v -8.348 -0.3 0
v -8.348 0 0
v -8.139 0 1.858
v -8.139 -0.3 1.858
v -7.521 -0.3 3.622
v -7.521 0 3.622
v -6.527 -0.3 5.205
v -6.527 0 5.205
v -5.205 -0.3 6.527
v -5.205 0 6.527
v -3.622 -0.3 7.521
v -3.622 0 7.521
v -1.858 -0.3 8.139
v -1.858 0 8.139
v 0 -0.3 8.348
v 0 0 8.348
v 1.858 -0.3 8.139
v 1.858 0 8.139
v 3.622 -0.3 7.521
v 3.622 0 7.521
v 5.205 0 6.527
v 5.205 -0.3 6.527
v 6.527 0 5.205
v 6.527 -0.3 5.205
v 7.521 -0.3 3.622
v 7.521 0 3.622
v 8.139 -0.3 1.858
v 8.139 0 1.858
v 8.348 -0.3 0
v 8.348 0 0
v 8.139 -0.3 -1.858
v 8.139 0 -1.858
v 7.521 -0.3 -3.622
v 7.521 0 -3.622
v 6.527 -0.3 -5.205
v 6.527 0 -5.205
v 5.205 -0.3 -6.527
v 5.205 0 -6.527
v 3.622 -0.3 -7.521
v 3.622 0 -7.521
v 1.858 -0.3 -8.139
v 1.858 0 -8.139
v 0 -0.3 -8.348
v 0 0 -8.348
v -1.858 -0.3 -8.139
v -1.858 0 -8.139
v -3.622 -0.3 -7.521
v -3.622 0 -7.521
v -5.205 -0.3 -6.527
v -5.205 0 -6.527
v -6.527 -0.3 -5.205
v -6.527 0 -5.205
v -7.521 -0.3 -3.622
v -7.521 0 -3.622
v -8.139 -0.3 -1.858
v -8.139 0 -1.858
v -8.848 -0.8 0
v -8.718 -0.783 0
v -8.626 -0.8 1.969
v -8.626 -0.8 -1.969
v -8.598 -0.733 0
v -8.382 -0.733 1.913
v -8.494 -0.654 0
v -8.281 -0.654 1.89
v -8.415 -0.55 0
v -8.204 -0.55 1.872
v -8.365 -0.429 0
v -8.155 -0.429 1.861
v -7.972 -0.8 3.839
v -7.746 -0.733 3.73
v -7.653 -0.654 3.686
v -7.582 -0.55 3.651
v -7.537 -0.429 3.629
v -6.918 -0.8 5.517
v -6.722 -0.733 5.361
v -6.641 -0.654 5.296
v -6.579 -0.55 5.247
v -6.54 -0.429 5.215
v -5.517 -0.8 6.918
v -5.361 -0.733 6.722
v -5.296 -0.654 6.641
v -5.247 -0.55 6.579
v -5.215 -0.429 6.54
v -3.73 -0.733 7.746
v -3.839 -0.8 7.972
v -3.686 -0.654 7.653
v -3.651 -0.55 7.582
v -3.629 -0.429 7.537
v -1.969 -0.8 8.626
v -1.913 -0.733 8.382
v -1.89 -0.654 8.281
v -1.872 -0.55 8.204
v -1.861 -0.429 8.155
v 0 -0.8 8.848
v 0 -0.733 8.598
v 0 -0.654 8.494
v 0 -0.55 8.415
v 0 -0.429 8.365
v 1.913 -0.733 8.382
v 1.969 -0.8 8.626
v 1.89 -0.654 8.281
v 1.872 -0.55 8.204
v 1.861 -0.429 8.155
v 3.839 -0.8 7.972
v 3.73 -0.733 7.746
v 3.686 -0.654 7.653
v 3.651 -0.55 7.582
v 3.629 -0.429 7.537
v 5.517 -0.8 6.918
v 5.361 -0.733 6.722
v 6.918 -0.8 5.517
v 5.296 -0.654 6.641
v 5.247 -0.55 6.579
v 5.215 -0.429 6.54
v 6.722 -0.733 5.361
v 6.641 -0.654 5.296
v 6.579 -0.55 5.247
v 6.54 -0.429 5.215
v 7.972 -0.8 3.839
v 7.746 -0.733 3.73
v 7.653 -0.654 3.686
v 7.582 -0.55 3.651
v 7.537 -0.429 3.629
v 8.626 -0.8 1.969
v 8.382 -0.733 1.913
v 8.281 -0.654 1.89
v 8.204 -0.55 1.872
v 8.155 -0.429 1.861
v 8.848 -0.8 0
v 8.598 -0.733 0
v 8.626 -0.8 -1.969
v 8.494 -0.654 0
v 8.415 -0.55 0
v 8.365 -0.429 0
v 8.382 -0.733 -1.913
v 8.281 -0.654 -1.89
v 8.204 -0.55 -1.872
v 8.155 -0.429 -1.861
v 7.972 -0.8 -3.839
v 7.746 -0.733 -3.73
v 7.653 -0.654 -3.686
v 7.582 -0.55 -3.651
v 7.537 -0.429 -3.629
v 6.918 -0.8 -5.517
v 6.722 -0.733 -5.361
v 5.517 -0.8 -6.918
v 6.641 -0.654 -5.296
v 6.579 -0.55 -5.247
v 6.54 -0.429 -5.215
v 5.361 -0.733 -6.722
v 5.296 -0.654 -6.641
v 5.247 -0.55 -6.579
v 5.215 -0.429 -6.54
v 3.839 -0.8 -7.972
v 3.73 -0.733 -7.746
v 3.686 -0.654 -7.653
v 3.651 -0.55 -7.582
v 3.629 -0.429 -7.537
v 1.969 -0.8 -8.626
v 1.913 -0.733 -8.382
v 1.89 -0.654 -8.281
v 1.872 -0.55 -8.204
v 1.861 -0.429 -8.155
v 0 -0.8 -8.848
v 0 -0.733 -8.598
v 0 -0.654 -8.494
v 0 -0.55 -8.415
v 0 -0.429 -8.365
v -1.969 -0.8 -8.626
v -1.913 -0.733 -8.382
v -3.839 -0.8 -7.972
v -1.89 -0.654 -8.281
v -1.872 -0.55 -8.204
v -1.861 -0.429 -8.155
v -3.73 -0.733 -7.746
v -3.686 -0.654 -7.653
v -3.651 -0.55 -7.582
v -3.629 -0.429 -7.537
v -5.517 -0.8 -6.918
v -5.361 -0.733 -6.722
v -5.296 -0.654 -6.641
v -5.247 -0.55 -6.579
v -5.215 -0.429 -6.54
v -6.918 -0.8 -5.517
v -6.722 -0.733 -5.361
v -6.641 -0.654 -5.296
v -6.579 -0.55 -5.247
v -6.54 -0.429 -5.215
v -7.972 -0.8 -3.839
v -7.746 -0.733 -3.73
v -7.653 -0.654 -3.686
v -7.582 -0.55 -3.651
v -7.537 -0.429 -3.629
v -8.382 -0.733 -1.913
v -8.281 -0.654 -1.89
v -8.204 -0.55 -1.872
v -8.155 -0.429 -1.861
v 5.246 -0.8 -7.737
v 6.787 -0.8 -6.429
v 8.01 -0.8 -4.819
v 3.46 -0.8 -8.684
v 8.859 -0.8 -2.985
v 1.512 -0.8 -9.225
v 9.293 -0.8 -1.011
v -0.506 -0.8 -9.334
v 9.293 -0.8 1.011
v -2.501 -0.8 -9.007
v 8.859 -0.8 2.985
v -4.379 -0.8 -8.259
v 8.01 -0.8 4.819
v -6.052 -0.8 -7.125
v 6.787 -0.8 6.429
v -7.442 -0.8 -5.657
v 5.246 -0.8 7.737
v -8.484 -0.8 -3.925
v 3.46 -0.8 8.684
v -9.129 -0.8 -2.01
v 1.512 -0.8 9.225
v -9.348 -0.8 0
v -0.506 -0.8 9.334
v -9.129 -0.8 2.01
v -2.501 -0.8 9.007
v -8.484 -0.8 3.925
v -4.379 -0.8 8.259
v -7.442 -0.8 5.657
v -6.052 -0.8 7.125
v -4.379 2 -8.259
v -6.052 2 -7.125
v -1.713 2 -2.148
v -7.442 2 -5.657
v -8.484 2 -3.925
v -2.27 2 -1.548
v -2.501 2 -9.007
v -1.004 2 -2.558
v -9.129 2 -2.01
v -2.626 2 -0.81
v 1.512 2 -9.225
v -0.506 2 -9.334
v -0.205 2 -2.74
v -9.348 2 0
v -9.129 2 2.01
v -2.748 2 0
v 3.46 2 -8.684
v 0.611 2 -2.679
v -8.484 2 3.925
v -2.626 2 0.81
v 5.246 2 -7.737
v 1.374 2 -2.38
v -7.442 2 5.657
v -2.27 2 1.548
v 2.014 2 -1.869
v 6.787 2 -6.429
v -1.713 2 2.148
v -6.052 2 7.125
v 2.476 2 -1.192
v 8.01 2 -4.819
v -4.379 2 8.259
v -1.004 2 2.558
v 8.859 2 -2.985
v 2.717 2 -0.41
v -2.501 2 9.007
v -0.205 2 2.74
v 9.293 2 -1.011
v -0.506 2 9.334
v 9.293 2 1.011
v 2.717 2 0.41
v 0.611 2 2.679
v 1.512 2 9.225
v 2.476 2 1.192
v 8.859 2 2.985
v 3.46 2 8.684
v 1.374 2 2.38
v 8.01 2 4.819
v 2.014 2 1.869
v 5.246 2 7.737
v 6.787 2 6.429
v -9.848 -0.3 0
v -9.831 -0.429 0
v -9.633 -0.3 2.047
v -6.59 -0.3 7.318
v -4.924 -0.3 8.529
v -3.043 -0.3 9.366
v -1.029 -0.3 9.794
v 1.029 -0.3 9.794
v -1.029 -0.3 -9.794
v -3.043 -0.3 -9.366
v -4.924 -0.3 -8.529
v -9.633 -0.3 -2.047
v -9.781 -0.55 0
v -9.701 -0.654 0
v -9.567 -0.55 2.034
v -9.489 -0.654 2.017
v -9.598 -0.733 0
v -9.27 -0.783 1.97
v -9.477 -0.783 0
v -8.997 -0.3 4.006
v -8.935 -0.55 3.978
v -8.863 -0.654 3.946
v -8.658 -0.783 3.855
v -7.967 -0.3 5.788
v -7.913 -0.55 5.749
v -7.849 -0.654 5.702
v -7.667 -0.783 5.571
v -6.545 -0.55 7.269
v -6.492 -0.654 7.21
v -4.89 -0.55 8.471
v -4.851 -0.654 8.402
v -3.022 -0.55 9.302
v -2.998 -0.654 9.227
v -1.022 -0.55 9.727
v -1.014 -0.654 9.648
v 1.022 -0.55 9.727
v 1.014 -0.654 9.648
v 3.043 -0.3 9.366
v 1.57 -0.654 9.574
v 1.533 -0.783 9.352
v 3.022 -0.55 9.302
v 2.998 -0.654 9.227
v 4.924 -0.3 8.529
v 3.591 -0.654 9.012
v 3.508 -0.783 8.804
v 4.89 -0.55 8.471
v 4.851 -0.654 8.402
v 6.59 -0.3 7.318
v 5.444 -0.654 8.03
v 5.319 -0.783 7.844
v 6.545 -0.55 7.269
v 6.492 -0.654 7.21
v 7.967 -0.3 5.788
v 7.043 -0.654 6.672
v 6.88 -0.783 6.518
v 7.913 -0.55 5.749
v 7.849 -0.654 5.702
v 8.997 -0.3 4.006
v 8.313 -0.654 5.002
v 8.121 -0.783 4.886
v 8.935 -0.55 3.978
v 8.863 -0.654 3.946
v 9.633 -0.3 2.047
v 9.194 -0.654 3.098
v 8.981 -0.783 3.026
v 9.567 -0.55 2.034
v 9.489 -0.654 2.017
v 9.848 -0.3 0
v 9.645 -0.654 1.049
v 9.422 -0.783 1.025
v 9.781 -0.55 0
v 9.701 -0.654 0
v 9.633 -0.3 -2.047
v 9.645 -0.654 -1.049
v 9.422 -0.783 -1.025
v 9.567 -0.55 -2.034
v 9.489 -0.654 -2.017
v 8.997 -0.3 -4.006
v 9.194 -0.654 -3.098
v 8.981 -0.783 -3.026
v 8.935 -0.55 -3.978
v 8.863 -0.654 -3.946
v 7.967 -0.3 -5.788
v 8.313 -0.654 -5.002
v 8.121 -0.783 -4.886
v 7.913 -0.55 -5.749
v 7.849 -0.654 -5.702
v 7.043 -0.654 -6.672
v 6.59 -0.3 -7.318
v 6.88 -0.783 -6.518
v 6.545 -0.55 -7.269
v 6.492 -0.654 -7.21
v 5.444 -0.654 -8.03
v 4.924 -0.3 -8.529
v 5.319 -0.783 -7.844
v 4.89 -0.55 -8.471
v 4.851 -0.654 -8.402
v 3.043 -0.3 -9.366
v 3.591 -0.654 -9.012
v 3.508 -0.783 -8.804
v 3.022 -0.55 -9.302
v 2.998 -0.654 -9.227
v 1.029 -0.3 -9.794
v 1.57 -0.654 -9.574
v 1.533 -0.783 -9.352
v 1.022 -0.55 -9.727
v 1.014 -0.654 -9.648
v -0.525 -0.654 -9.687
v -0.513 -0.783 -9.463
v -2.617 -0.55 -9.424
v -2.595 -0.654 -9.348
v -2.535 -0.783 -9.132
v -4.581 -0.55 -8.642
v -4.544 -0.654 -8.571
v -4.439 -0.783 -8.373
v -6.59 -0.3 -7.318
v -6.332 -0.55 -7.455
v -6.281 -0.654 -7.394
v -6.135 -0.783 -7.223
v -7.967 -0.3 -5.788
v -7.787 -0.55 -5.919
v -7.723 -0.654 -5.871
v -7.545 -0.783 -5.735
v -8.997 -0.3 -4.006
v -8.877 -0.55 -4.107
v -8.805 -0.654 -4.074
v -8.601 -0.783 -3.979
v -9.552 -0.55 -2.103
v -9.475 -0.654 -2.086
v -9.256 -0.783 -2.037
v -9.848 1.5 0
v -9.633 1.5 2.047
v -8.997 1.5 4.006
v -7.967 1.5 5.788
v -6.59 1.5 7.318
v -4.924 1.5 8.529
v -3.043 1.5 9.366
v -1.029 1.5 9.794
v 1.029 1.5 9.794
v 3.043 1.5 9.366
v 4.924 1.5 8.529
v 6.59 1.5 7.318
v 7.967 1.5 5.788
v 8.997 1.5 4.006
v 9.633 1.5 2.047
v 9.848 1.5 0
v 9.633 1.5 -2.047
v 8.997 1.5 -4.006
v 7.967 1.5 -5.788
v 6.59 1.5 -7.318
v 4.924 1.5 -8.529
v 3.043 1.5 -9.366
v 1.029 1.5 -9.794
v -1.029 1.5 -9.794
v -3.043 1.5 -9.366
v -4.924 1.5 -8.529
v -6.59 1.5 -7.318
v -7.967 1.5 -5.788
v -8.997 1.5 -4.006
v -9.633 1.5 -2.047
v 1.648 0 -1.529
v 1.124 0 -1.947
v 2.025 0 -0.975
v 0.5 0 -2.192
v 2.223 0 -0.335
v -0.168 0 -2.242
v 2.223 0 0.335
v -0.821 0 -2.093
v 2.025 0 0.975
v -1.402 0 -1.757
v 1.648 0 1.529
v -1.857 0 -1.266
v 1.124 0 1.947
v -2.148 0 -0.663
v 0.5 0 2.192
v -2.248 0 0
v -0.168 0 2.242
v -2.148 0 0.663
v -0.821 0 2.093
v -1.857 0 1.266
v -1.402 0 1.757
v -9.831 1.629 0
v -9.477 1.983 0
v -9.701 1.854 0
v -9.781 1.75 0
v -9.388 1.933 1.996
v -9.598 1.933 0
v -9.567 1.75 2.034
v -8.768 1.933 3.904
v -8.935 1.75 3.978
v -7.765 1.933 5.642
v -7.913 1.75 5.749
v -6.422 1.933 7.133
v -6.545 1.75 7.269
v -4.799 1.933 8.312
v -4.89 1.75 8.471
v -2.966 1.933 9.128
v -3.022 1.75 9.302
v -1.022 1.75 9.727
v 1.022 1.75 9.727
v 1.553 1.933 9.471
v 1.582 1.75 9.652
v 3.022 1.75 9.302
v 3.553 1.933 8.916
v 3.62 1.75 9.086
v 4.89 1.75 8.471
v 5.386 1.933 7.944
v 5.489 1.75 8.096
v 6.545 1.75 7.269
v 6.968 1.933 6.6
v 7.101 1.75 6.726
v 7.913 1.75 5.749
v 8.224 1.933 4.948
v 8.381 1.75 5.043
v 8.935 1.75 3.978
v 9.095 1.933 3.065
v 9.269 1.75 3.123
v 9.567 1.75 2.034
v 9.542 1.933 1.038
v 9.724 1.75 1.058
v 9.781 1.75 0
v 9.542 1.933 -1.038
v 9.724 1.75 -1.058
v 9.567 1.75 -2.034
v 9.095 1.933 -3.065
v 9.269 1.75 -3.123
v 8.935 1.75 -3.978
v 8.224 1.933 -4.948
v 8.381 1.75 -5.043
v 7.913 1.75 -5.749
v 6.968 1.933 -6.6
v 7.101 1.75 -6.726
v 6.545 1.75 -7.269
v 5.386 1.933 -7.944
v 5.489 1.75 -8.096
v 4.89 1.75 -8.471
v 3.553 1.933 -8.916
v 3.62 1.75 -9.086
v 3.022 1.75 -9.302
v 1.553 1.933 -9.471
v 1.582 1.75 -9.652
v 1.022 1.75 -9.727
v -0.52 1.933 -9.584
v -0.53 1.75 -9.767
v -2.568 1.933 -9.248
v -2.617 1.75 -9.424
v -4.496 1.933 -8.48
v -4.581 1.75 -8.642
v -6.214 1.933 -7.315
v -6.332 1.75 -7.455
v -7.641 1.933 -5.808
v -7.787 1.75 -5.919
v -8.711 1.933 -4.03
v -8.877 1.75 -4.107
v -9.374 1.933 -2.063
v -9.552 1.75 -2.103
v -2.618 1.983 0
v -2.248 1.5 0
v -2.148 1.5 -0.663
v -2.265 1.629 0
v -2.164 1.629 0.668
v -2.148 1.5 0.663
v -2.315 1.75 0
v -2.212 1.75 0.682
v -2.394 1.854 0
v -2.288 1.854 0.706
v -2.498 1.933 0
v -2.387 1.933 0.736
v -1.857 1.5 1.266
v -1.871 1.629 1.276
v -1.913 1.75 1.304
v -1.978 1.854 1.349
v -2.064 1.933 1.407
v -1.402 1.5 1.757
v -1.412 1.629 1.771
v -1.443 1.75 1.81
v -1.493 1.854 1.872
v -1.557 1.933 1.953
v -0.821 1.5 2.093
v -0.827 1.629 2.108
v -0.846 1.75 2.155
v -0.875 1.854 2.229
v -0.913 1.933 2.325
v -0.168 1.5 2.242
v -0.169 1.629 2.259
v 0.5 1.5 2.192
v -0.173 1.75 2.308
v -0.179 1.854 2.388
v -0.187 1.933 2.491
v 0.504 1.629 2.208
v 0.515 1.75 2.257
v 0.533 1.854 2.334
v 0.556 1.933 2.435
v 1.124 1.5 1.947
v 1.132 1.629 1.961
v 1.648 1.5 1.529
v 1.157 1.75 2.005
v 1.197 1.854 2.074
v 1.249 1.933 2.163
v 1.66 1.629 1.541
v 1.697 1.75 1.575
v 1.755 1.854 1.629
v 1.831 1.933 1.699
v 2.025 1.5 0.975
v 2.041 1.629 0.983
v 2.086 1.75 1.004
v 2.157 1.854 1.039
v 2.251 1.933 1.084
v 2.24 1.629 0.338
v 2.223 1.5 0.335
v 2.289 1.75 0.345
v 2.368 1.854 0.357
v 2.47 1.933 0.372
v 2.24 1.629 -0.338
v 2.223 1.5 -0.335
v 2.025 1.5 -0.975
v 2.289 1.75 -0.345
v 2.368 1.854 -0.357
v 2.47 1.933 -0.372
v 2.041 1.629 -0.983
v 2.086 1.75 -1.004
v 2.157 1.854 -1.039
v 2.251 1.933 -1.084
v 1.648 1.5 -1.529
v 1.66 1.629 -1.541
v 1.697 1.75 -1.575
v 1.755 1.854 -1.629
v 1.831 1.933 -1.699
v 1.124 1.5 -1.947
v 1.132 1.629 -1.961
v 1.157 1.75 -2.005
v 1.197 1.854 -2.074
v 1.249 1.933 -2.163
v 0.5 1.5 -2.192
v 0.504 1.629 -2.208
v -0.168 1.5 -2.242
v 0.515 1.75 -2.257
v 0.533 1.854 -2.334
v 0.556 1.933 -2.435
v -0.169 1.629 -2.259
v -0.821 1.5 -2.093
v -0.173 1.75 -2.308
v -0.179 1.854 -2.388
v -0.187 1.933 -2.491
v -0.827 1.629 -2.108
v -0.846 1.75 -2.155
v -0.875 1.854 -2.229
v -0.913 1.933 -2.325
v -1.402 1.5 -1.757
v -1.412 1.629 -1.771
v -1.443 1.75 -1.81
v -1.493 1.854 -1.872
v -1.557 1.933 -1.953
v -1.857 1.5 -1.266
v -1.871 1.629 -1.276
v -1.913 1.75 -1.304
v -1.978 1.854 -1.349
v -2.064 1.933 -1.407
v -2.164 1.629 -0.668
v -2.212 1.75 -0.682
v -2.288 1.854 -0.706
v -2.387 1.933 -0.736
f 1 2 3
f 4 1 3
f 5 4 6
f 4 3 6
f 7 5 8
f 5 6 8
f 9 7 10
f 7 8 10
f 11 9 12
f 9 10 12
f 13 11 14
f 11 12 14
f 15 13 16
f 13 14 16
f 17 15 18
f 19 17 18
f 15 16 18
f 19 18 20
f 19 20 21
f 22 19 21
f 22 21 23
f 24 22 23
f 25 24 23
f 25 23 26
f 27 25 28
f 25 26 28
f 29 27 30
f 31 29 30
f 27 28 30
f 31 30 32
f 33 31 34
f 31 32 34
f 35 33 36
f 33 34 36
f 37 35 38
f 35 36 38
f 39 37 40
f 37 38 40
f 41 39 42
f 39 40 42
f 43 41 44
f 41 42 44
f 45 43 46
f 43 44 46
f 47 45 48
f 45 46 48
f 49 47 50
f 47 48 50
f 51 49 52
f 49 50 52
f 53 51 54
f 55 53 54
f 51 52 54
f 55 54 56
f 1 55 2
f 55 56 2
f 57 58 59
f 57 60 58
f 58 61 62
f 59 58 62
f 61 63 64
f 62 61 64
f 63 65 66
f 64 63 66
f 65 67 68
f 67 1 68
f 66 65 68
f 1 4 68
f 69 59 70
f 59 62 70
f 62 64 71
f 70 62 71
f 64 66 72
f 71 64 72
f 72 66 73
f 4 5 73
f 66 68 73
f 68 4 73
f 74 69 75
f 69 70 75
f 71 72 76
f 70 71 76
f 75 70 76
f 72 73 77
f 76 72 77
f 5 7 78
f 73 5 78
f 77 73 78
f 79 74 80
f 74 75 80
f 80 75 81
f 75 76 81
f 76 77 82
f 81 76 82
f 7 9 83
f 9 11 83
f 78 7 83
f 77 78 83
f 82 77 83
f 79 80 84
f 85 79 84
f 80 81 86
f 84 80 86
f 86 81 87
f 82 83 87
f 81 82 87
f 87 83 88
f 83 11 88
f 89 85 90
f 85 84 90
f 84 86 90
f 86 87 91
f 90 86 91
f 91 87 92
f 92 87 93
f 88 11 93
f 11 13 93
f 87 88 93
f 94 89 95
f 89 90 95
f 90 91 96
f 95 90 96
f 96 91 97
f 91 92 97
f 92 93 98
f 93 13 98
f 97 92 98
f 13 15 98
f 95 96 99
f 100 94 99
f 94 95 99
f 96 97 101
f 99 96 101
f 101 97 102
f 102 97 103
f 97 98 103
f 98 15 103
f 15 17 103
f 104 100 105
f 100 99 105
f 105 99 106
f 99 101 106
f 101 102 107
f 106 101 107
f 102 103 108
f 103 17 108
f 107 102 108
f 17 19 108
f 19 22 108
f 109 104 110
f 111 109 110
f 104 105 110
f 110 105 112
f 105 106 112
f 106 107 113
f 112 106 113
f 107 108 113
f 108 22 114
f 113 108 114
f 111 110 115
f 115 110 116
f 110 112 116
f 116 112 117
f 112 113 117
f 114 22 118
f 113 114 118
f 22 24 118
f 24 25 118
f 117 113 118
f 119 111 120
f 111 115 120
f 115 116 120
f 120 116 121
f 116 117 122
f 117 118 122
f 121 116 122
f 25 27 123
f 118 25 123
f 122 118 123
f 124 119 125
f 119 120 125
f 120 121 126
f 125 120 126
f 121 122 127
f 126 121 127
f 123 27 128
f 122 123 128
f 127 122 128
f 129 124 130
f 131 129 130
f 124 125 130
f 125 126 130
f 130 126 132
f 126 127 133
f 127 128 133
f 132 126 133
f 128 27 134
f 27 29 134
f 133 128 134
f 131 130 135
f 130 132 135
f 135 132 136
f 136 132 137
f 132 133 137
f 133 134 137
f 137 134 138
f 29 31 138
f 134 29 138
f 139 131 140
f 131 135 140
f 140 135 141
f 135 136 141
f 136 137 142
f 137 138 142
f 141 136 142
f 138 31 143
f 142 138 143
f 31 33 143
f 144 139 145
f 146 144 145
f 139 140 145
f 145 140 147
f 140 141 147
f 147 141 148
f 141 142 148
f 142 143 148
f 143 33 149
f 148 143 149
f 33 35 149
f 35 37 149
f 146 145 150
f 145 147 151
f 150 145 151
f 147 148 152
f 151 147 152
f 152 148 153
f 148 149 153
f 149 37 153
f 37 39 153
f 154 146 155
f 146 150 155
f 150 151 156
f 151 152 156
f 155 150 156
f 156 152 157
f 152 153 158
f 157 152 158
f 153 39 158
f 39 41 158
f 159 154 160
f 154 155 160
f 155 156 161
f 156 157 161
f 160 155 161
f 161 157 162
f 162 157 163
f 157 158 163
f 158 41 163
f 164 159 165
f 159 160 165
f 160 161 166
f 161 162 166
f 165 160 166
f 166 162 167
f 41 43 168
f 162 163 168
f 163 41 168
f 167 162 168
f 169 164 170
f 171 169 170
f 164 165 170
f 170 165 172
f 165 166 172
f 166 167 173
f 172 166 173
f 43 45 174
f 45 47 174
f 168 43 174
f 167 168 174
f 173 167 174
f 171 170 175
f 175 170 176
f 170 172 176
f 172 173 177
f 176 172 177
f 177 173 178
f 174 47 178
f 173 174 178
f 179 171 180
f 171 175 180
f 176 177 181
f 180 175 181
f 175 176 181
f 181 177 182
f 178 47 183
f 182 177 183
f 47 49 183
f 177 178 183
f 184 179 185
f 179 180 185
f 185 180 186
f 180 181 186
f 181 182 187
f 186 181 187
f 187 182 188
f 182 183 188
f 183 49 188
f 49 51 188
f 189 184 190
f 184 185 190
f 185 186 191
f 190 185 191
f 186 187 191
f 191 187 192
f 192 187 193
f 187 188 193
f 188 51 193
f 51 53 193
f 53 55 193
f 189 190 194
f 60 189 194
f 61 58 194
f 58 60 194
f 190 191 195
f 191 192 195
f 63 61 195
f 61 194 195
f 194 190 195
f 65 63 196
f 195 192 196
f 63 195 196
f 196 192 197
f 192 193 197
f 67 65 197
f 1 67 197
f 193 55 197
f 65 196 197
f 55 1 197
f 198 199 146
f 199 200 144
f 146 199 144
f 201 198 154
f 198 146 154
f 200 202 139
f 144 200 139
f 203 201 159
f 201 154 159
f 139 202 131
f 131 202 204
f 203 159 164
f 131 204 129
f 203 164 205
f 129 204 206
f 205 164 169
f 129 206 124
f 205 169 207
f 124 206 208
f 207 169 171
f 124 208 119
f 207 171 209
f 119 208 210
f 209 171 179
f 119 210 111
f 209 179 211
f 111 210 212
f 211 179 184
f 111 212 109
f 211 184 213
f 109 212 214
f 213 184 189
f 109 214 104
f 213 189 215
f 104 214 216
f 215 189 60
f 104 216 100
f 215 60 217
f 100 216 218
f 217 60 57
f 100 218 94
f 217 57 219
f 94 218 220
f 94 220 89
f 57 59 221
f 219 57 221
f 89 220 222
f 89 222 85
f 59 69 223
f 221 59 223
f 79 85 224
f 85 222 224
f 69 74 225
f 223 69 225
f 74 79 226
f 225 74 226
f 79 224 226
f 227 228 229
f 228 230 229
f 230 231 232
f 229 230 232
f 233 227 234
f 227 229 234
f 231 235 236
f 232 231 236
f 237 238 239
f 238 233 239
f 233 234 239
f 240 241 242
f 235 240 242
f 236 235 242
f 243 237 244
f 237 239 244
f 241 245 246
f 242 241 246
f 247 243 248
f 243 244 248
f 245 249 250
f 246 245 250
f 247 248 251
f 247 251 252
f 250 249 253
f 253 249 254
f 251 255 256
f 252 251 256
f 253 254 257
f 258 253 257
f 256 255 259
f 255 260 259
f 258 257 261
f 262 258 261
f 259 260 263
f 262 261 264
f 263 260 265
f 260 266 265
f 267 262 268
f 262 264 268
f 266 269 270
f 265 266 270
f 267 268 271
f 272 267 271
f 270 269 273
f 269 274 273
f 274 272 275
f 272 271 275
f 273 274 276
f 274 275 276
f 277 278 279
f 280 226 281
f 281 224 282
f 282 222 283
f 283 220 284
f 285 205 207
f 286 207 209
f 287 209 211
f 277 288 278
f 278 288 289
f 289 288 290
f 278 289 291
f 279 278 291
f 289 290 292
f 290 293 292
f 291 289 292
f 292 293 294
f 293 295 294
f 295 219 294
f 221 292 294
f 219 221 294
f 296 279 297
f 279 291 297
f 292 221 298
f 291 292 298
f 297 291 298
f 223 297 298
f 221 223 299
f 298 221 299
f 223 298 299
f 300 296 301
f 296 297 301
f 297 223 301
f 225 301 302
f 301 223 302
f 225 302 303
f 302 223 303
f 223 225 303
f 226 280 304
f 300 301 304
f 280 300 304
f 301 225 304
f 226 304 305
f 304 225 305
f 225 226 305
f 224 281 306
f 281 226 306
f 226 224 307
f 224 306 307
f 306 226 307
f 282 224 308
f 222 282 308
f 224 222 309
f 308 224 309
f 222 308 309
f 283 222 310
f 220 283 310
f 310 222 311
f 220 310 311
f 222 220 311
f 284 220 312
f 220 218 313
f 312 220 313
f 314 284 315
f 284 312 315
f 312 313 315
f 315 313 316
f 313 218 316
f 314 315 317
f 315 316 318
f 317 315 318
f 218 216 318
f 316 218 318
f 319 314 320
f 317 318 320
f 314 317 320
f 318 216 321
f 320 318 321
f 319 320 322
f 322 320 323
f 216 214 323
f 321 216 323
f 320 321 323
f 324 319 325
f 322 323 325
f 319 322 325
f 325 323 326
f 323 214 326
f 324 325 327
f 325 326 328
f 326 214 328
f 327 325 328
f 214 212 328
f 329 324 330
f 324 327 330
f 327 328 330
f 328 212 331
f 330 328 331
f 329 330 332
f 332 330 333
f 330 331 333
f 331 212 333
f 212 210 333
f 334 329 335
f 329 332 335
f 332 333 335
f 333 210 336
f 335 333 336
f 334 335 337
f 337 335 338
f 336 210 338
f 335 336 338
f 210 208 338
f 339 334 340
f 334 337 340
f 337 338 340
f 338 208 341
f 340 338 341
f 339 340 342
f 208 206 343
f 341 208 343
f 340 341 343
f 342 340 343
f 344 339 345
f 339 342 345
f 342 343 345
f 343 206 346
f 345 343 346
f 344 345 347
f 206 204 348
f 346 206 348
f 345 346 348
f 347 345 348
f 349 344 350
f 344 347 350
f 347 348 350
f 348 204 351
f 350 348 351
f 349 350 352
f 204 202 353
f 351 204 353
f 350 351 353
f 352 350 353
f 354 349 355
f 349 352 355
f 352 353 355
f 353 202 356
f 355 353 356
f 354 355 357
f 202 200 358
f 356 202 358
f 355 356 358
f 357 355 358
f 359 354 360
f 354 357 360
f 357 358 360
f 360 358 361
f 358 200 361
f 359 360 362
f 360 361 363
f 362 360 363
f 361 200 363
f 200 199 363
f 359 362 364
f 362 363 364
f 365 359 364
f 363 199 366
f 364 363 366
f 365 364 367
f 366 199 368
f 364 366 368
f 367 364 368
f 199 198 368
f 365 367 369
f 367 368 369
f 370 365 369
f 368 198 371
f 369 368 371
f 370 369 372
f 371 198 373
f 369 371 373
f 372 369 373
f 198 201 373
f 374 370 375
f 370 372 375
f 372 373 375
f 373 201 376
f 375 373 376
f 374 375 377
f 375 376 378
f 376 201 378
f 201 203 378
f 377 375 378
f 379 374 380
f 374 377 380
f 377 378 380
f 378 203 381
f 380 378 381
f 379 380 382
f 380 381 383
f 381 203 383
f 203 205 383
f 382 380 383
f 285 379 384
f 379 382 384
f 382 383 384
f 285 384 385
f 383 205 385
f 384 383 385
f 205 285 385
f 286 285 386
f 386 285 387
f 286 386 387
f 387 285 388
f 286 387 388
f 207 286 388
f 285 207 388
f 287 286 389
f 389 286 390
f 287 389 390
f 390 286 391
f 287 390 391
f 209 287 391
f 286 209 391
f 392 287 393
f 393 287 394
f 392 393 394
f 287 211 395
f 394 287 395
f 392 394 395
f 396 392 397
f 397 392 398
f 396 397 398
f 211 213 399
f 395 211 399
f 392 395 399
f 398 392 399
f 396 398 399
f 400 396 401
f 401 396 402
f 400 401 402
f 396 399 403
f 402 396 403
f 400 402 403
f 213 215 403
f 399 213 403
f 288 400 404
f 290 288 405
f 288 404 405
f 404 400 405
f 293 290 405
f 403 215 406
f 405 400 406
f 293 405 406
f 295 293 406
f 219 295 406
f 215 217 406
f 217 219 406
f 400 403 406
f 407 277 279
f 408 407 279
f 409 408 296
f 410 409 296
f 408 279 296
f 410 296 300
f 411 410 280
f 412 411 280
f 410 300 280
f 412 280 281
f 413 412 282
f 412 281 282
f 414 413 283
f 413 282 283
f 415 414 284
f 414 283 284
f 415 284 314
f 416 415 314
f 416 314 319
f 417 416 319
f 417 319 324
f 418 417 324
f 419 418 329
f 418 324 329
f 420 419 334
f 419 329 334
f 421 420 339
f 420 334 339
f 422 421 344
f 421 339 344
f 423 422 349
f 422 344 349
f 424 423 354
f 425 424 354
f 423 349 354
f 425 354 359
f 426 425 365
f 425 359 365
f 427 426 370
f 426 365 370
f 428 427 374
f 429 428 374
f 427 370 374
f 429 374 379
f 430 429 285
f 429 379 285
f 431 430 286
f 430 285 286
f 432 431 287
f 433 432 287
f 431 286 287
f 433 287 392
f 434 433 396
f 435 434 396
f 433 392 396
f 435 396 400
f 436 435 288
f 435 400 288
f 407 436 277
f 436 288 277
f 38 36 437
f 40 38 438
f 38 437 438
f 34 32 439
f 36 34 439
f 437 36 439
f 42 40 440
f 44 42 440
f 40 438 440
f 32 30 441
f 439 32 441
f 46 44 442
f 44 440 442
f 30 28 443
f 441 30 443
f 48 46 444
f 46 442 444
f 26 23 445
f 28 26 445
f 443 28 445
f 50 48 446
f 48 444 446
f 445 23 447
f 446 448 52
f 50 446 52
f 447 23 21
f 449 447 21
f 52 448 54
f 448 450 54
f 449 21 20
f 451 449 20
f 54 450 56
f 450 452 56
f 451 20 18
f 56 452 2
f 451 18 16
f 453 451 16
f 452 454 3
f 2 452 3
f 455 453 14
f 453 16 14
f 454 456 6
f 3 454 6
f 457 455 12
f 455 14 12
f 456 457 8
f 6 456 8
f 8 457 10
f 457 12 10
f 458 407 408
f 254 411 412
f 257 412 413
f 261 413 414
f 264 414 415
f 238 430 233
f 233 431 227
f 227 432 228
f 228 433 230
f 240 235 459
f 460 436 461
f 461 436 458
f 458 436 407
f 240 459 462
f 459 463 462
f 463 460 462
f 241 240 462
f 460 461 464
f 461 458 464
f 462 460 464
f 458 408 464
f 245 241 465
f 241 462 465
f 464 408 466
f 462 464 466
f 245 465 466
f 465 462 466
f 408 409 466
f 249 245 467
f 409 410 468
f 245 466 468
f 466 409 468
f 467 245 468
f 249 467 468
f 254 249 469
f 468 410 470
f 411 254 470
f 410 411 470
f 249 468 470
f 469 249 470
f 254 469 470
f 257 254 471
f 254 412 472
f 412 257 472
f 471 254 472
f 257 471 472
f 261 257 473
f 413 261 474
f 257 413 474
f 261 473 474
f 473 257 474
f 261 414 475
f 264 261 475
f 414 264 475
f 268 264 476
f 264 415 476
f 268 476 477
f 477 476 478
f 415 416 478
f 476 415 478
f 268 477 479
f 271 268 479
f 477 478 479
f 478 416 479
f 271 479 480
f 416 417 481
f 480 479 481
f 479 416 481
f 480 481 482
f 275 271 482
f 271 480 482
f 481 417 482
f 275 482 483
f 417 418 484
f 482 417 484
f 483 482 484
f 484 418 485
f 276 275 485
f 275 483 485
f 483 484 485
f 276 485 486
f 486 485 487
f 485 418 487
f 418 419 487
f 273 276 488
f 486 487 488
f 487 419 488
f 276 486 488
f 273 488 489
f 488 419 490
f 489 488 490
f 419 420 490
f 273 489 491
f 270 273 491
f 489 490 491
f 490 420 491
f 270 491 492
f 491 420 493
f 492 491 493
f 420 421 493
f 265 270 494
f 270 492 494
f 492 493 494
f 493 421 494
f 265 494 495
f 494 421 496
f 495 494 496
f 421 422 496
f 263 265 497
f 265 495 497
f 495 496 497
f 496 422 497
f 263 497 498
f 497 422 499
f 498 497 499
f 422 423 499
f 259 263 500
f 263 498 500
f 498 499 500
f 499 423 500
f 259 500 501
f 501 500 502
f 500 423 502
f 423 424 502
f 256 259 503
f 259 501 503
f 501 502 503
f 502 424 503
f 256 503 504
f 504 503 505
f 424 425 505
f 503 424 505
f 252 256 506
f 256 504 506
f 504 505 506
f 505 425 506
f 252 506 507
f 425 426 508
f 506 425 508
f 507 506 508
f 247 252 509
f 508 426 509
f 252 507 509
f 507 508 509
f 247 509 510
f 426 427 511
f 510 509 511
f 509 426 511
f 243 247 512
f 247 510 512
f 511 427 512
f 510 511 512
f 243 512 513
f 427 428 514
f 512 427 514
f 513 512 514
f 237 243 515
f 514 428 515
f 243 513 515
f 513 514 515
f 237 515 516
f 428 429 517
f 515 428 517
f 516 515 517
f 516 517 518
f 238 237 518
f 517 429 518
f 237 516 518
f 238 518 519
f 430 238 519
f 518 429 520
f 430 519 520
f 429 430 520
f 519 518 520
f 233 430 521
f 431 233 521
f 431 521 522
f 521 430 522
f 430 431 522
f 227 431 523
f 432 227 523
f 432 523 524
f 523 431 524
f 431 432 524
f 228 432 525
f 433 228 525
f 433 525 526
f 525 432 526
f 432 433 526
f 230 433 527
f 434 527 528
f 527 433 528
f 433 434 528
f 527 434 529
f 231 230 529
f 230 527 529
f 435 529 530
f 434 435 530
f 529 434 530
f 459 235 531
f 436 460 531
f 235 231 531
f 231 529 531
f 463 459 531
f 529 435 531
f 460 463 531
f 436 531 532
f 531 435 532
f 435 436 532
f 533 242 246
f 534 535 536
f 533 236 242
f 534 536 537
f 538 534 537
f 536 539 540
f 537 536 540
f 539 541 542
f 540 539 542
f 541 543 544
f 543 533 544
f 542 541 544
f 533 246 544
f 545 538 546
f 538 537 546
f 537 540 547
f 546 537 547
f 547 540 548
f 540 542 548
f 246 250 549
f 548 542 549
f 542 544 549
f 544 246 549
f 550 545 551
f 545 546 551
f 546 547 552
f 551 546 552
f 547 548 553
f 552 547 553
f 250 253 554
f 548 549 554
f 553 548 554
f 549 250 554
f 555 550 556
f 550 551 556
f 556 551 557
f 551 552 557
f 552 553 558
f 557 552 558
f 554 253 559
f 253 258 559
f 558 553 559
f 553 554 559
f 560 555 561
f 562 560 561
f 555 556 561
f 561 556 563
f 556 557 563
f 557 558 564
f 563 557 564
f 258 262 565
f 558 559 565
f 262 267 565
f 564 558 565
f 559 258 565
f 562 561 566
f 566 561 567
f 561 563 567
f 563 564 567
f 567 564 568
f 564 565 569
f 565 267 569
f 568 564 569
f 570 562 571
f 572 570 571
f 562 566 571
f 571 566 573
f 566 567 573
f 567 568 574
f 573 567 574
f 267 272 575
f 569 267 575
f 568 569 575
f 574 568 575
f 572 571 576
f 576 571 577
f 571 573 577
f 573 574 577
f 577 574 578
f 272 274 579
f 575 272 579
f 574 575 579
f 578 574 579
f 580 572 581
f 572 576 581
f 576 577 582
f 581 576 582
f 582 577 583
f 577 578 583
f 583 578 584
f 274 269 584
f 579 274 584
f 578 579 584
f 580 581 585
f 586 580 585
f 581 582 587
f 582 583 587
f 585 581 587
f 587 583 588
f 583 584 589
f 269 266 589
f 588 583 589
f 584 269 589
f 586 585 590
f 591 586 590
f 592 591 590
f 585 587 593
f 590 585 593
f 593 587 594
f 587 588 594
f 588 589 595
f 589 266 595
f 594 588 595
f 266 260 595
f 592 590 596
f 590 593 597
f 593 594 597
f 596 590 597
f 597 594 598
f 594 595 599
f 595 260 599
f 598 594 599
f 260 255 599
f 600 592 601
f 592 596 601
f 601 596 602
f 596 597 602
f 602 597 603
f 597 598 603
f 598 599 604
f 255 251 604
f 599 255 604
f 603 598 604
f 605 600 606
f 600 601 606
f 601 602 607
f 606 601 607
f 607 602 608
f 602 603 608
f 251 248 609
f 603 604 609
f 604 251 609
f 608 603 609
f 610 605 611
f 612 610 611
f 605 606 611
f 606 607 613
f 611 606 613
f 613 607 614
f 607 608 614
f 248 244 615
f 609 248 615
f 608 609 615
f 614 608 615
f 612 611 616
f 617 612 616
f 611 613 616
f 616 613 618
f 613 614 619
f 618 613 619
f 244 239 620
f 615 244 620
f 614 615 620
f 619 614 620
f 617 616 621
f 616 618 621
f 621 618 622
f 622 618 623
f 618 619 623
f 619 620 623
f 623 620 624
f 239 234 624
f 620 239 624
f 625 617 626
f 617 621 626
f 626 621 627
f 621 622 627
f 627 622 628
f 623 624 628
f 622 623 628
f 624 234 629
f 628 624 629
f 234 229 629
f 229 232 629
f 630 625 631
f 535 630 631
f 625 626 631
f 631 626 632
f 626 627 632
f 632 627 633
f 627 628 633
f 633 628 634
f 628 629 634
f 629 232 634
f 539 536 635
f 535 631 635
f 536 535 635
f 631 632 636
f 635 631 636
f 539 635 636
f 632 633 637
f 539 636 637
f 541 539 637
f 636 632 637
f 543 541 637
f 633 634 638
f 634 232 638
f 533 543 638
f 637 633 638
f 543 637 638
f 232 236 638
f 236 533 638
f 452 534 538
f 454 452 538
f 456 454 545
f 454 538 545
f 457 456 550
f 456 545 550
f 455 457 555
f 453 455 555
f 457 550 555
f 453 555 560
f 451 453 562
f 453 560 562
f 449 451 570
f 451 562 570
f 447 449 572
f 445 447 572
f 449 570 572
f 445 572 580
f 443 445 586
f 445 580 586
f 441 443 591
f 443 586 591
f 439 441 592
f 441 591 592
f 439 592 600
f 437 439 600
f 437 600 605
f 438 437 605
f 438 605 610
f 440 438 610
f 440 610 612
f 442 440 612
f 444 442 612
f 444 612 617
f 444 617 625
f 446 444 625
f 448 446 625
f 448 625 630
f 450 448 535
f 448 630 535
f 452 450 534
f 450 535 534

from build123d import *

# Parameters (mm, degrees)
FILLET1_R = 0.5


with BuildPart() as part:
    # Sketch1 → Revolve1 (revolve)
    with BuildSketch(Plane.XY):
        Polygon((-2.2479, 0), (-2.2479, 2), (-9.8479, 2), (-9.8479, -0.8), (-8.3479, -0.8), (-8.3479, 0), align=None)
    revolve(axis=Axis((0, 0, 0), (0, 1, 0)))

    # Fillet1
    fillet1_edges = [part.edges().sort_by_distance(p)[0] for p in [
        (8.3479, -0.8, 0),
        (9.8479, -0.8, 0),
        (9.8479, 2, 0),
        (2.2479, 2, 0),
    ]]
    fillet(fillet1_edges, radius=FILLET1_R)


solid = part.part
